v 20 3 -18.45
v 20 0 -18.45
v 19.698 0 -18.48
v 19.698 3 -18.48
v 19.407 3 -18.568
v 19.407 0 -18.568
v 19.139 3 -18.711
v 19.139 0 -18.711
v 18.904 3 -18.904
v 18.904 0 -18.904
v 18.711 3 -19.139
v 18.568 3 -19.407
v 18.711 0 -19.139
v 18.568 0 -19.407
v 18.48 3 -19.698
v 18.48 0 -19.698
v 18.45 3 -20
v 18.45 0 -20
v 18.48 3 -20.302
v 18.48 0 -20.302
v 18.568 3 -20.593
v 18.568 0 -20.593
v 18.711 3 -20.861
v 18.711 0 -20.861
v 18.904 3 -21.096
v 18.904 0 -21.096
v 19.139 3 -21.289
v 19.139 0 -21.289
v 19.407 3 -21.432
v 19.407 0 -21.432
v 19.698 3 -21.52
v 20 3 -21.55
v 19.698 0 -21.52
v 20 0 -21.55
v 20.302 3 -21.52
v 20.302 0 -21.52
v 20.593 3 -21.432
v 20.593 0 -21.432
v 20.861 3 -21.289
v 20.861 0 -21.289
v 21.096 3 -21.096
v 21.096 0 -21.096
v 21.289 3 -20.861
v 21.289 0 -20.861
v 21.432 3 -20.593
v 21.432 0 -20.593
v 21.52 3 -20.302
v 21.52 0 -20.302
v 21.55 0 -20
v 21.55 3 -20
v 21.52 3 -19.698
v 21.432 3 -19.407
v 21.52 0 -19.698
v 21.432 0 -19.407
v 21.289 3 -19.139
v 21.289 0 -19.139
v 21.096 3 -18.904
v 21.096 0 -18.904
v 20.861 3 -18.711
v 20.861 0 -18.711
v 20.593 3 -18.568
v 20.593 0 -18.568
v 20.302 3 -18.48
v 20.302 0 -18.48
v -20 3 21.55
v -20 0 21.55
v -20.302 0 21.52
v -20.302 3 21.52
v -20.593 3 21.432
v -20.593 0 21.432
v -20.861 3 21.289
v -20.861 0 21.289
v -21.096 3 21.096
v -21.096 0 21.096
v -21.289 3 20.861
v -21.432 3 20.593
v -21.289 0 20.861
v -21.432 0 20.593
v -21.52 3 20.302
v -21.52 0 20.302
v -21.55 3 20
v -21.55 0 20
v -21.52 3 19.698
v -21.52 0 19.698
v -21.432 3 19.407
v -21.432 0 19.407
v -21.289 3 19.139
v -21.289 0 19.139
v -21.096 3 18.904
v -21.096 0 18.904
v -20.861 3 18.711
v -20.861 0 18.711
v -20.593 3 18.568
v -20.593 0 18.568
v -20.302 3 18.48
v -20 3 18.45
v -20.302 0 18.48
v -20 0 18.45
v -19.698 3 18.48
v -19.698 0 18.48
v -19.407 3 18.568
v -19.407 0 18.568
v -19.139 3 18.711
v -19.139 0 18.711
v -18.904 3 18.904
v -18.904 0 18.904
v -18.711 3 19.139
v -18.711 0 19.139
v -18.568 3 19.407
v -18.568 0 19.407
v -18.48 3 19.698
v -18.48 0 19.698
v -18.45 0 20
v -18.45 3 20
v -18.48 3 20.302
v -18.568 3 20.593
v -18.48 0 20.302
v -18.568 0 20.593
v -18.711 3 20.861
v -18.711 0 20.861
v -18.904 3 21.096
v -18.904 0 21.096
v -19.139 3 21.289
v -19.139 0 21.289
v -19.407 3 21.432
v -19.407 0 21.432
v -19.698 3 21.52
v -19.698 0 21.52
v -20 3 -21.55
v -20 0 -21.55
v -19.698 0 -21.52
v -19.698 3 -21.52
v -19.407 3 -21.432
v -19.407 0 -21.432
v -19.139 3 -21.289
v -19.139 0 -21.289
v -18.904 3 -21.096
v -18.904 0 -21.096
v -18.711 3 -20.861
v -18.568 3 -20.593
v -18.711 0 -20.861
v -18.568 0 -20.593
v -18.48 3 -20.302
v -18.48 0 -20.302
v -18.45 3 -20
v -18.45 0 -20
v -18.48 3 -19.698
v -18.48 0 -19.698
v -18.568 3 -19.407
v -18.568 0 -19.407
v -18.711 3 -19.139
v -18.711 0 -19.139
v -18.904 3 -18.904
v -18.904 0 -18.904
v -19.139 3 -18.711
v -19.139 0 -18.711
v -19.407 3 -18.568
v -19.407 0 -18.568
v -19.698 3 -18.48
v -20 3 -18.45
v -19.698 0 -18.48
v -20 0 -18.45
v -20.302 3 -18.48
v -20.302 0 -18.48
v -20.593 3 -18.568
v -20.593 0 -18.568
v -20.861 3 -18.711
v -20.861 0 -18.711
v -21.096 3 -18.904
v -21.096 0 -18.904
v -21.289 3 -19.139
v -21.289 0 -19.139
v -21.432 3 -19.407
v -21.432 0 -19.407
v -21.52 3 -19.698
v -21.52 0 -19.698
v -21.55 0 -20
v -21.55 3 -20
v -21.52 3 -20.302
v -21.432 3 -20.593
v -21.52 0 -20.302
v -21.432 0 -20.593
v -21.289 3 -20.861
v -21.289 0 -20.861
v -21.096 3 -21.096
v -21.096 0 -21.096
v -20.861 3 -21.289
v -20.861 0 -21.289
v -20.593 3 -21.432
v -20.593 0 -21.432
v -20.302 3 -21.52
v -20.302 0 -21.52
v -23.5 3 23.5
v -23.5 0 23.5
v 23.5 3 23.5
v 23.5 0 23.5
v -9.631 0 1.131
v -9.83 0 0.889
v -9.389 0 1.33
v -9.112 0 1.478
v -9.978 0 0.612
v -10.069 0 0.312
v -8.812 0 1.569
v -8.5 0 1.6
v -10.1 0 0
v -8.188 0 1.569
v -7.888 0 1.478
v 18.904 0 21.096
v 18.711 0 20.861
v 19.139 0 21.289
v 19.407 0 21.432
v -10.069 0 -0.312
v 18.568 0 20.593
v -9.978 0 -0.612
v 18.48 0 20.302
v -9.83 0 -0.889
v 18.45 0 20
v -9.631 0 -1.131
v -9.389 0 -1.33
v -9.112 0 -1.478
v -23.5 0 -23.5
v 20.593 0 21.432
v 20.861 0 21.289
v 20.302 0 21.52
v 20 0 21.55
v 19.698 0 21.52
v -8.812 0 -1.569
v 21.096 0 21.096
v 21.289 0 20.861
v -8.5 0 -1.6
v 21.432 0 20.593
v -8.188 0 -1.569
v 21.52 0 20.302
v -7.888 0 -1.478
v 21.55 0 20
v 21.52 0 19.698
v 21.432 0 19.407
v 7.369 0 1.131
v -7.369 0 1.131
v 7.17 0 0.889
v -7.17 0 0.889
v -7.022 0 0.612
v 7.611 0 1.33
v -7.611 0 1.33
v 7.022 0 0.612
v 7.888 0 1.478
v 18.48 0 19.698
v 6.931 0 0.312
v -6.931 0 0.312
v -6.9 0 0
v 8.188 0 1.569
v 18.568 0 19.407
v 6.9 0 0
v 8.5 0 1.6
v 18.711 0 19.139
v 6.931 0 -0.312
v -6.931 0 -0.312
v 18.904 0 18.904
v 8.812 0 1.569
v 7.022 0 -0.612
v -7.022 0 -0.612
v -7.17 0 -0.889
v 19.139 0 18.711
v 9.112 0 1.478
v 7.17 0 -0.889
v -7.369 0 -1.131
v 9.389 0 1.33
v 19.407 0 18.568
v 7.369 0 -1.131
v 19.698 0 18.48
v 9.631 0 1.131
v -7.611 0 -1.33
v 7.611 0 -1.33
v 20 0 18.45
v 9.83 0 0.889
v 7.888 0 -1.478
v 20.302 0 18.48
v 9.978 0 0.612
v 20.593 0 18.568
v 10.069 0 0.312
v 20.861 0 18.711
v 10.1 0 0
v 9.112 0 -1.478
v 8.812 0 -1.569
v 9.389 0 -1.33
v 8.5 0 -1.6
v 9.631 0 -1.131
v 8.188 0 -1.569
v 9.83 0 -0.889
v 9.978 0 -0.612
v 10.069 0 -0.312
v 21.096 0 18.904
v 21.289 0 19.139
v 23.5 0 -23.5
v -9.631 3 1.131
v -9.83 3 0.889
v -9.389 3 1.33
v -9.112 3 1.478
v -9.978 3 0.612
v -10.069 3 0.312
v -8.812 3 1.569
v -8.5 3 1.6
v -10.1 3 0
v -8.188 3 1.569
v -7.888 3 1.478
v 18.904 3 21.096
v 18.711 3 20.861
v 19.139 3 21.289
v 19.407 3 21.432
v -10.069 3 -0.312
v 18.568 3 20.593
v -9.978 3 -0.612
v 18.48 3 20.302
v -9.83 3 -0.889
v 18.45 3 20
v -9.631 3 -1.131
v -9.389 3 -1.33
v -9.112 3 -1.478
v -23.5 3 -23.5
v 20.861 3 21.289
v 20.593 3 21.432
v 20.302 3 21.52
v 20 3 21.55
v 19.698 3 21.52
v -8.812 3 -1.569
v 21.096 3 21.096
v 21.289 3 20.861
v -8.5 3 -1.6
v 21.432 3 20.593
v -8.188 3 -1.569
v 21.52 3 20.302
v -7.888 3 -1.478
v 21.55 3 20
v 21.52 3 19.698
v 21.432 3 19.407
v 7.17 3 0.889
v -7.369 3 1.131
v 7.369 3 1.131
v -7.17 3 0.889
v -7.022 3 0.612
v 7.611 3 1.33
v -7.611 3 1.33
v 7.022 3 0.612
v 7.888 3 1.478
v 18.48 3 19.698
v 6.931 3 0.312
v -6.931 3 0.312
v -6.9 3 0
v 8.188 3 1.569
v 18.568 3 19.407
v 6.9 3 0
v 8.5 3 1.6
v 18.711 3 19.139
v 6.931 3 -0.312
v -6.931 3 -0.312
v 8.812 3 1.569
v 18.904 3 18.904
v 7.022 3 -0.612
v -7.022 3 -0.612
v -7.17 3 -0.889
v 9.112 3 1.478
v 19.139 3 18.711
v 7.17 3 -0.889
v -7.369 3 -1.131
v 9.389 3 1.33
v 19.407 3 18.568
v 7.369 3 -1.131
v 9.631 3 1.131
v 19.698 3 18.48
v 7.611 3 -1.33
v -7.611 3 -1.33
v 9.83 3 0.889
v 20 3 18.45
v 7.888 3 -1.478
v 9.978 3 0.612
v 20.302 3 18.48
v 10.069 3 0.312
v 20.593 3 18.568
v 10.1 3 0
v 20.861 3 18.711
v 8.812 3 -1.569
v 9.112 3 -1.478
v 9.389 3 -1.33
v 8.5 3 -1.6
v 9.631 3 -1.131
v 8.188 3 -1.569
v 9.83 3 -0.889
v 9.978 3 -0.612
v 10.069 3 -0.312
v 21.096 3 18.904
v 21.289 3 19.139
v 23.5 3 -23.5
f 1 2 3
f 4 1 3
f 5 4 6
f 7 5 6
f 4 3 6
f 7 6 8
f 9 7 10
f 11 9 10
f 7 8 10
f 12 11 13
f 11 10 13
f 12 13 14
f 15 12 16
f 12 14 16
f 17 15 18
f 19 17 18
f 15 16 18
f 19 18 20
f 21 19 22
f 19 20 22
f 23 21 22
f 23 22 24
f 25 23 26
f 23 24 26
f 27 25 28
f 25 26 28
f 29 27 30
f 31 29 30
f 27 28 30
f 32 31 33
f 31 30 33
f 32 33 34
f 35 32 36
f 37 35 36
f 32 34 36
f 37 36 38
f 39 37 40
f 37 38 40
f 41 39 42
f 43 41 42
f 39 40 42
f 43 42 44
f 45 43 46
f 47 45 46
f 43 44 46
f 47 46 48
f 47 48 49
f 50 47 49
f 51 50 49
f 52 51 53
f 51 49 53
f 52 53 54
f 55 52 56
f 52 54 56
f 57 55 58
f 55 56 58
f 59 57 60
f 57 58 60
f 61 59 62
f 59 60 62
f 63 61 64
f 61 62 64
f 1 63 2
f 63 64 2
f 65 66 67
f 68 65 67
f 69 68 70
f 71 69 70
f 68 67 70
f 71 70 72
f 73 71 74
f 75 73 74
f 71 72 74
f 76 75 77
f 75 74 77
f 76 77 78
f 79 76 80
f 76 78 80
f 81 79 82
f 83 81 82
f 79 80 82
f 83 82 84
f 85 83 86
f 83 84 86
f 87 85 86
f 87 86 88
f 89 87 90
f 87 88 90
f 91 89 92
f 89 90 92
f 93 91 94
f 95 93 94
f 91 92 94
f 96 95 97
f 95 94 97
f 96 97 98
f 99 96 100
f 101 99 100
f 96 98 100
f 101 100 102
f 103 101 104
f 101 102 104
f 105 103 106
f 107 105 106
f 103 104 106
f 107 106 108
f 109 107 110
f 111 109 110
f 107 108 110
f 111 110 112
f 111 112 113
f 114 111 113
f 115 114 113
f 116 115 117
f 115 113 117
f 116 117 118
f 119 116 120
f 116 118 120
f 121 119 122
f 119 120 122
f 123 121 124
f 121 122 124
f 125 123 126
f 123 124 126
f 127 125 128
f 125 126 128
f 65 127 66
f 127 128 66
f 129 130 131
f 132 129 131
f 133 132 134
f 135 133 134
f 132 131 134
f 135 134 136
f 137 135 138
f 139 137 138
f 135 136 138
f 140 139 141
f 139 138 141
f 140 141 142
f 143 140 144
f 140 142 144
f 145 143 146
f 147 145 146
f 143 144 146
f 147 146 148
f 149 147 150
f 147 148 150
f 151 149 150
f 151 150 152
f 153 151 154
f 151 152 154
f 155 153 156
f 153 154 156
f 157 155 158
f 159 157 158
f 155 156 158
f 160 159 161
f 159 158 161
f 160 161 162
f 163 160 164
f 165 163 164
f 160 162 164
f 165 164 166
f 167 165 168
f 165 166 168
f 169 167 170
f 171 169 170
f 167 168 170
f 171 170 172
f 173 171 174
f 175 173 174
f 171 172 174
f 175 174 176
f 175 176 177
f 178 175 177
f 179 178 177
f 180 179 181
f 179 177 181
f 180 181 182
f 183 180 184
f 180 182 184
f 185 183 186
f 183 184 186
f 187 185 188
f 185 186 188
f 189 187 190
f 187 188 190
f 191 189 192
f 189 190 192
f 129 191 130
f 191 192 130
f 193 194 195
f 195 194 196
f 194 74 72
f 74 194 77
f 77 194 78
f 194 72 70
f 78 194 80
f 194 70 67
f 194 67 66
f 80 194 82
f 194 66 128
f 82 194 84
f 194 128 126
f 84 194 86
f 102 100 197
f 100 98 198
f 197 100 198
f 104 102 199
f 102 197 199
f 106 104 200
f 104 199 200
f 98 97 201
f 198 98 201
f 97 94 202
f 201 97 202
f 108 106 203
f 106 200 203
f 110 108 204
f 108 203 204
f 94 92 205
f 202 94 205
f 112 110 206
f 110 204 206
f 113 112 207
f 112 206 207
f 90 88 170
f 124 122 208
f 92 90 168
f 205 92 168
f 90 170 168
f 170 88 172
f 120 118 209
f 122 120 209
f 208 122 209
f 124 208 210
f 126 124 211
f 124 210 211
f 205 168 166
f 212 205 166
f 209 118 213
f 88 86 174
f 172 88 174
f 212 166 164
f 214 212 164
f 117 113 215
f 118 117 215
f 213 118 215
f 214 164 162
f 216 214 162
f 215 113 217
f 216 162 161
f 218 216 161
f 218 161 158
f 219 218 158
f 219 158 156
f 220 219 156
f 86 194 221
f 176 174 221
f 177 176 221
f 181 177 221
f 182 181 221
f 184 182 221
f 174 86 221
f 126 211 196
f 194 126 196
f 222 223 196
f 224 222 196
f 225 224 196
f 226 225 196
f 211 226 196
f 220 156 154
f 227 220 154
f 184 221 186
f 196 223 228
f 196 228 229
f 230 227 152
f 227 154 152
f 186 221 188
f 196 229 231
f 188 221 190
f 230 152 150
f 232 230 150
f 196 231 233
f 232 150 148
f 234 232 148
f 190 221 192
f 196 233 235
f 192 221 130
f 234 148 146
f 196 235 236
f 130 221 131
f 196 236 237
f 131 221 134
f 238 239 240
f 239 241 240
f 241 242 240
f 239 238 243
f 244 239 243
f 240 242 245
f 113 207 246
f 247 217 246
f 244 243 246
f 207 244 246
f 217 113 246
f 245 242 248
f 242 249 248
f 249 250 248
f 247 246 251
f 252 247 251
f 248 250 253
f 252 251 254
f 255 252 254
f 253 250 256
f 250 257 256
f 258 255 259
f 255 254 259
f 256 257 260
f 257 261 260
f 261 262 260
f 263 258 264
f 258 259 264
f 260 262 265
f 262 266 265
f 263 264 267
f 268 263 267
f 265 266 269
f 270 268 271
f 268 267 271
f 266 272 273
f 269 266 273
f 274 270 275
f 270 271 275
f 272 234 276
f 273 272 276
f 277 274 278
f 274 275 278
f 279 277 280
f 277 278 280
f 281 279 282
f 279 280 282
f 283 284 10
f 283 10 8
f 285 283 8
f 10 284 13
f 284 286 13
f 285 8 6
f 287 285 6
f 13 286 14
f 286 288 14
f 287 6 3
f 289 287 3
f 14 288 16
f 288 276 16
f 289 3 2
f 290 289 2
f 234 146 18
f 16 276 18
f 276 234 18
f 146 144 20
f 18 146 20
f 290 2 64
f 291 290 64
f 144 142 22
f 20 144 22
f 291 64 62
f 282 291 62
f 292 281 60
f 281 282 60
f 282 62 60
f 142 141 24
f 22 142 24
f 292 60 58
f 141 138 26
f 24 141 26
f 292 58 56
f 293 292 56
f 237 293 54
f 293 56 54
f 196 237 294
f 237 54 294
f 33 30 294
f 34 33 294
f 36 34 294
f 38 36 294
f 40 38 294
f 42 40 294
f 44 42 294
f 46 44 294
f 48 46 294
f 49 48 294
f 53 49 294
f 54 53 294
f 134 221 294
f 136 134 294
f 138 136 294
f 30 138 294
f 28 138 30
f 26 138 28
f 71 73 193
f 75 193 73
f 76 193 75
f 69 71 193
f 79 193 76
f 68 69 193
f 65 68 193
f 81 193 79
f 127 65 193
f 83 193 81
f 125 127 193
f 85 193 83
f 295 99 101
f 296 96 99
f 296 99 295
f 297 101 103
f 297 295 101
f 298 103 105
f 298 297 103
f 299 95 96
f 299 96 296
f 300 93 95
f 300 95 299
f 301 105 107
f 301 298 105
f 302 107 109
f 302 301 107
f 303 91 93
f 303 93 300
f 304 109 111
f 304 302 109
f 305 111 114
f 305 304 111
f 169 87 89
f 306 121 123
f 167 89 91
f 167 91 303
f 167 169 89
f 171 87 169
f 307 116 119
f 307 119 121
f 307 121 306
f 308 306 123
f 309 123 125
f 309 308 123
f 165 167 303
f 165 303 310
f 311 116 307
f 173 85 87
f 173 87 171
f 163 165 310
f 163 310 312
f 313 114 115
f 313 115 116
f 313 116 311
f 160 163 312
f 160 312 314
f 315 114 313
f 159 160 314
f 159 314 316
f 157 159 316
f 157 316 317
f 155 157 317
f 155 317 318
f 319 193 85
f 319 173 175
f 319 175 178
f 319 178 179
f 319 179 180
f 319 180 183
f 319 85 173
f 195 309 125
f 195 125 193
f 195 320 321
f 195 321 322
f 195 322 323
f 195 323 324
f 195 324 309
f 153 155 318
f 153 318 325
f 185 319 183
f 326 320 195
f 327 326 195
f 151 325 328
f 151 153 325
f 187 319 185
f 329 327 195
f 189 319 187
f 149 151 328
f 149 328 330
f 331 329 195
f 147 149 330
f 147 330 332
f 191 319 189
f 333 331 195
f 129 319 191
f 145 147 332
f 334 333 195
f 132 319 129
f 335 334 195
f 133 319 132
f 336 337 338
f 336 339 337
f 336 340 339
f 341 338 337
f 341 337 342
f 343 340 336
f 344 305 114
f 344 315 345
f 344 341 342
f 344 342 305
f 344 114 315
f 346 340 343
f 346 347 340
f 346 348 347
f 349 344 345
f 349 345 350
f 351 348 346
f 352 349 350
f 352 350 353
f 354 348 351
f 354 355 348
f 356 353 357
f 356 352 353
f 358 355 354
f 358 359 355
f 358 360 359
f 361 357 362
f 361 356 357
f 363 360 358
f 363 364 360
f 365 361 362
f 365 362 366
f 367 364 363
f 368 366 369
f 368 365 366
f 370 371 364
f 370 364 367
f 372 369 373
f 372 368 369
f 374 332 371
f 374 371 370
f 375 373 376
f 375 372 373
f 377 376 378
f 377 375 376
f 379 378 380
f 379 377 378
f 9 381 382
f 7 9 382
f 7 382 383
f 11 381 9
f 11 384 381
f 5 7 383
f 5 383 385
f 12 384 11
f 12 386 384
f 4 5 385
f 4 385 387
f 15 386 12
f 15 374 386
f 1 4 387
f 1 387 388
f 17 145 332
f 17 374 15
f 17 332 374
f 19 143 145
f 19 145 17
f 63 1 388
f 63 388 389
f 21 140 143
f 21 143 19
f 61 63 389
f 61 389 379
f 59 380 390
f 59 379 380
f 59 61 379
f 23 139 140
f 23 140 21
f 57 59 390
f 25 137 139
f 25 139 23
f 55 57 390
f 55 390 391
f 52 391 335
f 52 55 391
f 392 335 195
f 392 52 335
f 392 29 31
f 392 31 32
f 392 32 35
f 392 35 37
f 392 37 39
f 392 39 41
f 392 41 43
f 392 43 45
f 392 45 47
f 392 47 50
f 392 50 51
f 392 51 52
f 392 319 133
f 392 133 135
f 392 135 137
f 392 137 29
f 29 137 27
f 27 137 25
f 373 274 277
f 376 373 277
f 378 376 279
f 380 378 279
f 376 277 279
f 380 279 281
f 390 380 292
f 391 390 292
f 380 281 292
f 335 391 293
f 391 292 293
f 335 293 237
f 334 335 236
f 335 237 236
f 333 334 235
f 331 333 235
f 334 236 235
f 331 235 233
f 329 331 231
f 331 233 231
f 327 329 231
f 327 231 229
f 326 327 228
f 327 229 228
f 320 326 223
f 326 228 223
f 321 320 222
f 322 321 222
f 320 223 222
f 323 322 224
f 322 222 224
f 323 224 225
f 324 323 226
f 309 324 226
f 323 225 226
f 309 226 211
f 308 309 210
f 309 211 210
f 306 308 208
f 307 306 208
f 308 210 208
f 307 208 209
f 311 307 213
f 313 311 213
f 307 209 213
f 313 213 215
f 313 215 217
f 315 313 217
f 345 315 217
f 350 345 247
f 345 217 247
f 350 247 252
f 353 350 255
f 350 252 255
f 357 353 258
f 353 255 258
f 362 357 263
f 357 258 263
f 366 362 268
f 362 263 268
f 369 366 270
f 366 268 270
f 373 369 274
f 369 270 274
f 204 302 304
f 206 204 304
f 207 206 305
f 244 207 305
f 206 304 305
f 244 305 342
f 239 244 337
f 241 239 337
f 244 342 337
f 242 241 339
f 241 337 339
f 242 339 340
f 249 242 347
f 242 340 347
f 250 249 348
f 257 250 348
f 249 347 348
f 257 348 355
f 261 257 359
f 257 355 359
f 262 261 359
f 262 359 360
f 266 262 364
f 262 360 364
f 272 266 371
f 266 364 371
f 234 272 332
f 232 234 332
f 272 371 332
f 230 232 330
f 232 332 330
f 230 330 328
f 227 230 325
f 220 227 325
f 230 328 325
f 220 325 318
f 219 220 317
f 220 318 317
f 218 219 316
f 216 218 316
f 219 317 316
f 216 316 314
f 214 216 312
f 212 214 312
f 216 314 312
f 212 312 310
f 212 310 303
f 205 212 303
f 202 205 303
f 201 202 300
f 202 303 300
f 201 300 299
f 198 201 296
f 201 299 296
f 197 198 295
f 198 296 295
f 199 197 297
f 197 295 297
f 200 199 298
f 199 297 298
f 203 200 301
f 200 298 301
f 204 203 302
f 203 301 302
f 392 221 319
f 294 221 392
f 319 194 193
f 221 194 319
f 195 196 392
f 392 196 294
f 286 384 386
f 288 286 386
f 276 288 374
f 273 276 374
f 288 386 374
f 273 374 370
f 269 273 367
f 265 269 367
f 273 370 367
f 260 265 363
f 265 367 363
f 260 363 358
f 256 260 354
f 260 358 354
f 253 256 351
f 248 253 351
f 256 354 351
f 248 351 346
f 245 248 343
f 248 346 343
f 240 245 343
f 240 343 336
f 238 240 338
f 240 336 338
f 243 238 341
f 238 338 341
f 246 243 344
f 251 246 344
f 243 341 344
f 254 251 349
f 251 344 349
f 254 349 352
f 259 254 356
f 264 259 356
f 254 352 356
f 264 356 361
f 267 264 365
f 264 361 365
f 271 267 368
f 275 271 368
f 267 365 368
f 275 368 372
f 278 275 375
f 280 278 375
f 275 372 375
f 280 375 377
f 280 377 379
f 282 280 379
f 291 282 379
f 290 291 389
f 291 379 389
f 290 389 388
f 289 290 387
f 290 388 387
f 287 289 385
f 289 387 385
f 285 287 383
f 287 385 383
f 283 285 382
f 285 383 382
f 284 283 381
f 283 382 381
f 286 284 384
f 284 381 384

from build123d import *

# Parameters (mm, degrees)
SKETCH_1_W          = 47
SKETCH_1_H          = 47
EXTRUDE_1_DEPTH     = 3
SKETCH_3_R          = 1.55
CUT_EXTRUDE_2_DEPTH = 3
SKETCH_4_R          = 1.6
CUT_EXTRUDE_3_DEPTH = 3


with BuildPart() as part:
    # 草图1 → 凸台-拉伸1 (new body)
    with BuildSketch(Plane(origin=(0, 0, 0), x_dir=(1, 0, 0), z_dir=(0, 1, 0))):
        Rectangle(SKETCH_1_W, SKETCH_1_H)
    extrude(amount=EXTRUDE_1_DEPTH)

    # 草图3 → 切除-拉伸2 (cut)
    with BuildSketch(Plane.XZ):
        with Locations(Location((20, 20, 0), (0, 0, 270))):
            Circle(SKETCH_3_R)
        with Locations(Location((-20, 20, 0), (0, 0, 90))):
            Circle(SKETCH_3_R)
        with Locations(Location((20, -20, 0), (0, 0, 90))):
            Circle(SKETCH_3_R)
        with Locations(Location((-20, -20, 0), (0, 0, 270))):
            Circle(SKETCH_3_R)
    extrude(amount=-CUT_EXTRUDE_2_DEPTH, mode=Mode.SUBTRACT)

    # 草图4 → 切除-拉伸3 (cut)
    with BuildSketch(Plane(origin=(0, 3, 0), x_dir=(1, 0, 0), z_dir=(0, 1, 0))):
        with Locations(Location((-8.5, 0, 0), (0, 0, 270))):
            Circle(SKETCH_4_R)
        with Locations(Location((8.5, 0, 0), (0, 0, 90))):
            Circle(SKETCH_4_R)
    extrude(amount=-CUT_EXTRUDE_3_DEPTH, mode=Mode.SUBTRACT)


solid = part.part
